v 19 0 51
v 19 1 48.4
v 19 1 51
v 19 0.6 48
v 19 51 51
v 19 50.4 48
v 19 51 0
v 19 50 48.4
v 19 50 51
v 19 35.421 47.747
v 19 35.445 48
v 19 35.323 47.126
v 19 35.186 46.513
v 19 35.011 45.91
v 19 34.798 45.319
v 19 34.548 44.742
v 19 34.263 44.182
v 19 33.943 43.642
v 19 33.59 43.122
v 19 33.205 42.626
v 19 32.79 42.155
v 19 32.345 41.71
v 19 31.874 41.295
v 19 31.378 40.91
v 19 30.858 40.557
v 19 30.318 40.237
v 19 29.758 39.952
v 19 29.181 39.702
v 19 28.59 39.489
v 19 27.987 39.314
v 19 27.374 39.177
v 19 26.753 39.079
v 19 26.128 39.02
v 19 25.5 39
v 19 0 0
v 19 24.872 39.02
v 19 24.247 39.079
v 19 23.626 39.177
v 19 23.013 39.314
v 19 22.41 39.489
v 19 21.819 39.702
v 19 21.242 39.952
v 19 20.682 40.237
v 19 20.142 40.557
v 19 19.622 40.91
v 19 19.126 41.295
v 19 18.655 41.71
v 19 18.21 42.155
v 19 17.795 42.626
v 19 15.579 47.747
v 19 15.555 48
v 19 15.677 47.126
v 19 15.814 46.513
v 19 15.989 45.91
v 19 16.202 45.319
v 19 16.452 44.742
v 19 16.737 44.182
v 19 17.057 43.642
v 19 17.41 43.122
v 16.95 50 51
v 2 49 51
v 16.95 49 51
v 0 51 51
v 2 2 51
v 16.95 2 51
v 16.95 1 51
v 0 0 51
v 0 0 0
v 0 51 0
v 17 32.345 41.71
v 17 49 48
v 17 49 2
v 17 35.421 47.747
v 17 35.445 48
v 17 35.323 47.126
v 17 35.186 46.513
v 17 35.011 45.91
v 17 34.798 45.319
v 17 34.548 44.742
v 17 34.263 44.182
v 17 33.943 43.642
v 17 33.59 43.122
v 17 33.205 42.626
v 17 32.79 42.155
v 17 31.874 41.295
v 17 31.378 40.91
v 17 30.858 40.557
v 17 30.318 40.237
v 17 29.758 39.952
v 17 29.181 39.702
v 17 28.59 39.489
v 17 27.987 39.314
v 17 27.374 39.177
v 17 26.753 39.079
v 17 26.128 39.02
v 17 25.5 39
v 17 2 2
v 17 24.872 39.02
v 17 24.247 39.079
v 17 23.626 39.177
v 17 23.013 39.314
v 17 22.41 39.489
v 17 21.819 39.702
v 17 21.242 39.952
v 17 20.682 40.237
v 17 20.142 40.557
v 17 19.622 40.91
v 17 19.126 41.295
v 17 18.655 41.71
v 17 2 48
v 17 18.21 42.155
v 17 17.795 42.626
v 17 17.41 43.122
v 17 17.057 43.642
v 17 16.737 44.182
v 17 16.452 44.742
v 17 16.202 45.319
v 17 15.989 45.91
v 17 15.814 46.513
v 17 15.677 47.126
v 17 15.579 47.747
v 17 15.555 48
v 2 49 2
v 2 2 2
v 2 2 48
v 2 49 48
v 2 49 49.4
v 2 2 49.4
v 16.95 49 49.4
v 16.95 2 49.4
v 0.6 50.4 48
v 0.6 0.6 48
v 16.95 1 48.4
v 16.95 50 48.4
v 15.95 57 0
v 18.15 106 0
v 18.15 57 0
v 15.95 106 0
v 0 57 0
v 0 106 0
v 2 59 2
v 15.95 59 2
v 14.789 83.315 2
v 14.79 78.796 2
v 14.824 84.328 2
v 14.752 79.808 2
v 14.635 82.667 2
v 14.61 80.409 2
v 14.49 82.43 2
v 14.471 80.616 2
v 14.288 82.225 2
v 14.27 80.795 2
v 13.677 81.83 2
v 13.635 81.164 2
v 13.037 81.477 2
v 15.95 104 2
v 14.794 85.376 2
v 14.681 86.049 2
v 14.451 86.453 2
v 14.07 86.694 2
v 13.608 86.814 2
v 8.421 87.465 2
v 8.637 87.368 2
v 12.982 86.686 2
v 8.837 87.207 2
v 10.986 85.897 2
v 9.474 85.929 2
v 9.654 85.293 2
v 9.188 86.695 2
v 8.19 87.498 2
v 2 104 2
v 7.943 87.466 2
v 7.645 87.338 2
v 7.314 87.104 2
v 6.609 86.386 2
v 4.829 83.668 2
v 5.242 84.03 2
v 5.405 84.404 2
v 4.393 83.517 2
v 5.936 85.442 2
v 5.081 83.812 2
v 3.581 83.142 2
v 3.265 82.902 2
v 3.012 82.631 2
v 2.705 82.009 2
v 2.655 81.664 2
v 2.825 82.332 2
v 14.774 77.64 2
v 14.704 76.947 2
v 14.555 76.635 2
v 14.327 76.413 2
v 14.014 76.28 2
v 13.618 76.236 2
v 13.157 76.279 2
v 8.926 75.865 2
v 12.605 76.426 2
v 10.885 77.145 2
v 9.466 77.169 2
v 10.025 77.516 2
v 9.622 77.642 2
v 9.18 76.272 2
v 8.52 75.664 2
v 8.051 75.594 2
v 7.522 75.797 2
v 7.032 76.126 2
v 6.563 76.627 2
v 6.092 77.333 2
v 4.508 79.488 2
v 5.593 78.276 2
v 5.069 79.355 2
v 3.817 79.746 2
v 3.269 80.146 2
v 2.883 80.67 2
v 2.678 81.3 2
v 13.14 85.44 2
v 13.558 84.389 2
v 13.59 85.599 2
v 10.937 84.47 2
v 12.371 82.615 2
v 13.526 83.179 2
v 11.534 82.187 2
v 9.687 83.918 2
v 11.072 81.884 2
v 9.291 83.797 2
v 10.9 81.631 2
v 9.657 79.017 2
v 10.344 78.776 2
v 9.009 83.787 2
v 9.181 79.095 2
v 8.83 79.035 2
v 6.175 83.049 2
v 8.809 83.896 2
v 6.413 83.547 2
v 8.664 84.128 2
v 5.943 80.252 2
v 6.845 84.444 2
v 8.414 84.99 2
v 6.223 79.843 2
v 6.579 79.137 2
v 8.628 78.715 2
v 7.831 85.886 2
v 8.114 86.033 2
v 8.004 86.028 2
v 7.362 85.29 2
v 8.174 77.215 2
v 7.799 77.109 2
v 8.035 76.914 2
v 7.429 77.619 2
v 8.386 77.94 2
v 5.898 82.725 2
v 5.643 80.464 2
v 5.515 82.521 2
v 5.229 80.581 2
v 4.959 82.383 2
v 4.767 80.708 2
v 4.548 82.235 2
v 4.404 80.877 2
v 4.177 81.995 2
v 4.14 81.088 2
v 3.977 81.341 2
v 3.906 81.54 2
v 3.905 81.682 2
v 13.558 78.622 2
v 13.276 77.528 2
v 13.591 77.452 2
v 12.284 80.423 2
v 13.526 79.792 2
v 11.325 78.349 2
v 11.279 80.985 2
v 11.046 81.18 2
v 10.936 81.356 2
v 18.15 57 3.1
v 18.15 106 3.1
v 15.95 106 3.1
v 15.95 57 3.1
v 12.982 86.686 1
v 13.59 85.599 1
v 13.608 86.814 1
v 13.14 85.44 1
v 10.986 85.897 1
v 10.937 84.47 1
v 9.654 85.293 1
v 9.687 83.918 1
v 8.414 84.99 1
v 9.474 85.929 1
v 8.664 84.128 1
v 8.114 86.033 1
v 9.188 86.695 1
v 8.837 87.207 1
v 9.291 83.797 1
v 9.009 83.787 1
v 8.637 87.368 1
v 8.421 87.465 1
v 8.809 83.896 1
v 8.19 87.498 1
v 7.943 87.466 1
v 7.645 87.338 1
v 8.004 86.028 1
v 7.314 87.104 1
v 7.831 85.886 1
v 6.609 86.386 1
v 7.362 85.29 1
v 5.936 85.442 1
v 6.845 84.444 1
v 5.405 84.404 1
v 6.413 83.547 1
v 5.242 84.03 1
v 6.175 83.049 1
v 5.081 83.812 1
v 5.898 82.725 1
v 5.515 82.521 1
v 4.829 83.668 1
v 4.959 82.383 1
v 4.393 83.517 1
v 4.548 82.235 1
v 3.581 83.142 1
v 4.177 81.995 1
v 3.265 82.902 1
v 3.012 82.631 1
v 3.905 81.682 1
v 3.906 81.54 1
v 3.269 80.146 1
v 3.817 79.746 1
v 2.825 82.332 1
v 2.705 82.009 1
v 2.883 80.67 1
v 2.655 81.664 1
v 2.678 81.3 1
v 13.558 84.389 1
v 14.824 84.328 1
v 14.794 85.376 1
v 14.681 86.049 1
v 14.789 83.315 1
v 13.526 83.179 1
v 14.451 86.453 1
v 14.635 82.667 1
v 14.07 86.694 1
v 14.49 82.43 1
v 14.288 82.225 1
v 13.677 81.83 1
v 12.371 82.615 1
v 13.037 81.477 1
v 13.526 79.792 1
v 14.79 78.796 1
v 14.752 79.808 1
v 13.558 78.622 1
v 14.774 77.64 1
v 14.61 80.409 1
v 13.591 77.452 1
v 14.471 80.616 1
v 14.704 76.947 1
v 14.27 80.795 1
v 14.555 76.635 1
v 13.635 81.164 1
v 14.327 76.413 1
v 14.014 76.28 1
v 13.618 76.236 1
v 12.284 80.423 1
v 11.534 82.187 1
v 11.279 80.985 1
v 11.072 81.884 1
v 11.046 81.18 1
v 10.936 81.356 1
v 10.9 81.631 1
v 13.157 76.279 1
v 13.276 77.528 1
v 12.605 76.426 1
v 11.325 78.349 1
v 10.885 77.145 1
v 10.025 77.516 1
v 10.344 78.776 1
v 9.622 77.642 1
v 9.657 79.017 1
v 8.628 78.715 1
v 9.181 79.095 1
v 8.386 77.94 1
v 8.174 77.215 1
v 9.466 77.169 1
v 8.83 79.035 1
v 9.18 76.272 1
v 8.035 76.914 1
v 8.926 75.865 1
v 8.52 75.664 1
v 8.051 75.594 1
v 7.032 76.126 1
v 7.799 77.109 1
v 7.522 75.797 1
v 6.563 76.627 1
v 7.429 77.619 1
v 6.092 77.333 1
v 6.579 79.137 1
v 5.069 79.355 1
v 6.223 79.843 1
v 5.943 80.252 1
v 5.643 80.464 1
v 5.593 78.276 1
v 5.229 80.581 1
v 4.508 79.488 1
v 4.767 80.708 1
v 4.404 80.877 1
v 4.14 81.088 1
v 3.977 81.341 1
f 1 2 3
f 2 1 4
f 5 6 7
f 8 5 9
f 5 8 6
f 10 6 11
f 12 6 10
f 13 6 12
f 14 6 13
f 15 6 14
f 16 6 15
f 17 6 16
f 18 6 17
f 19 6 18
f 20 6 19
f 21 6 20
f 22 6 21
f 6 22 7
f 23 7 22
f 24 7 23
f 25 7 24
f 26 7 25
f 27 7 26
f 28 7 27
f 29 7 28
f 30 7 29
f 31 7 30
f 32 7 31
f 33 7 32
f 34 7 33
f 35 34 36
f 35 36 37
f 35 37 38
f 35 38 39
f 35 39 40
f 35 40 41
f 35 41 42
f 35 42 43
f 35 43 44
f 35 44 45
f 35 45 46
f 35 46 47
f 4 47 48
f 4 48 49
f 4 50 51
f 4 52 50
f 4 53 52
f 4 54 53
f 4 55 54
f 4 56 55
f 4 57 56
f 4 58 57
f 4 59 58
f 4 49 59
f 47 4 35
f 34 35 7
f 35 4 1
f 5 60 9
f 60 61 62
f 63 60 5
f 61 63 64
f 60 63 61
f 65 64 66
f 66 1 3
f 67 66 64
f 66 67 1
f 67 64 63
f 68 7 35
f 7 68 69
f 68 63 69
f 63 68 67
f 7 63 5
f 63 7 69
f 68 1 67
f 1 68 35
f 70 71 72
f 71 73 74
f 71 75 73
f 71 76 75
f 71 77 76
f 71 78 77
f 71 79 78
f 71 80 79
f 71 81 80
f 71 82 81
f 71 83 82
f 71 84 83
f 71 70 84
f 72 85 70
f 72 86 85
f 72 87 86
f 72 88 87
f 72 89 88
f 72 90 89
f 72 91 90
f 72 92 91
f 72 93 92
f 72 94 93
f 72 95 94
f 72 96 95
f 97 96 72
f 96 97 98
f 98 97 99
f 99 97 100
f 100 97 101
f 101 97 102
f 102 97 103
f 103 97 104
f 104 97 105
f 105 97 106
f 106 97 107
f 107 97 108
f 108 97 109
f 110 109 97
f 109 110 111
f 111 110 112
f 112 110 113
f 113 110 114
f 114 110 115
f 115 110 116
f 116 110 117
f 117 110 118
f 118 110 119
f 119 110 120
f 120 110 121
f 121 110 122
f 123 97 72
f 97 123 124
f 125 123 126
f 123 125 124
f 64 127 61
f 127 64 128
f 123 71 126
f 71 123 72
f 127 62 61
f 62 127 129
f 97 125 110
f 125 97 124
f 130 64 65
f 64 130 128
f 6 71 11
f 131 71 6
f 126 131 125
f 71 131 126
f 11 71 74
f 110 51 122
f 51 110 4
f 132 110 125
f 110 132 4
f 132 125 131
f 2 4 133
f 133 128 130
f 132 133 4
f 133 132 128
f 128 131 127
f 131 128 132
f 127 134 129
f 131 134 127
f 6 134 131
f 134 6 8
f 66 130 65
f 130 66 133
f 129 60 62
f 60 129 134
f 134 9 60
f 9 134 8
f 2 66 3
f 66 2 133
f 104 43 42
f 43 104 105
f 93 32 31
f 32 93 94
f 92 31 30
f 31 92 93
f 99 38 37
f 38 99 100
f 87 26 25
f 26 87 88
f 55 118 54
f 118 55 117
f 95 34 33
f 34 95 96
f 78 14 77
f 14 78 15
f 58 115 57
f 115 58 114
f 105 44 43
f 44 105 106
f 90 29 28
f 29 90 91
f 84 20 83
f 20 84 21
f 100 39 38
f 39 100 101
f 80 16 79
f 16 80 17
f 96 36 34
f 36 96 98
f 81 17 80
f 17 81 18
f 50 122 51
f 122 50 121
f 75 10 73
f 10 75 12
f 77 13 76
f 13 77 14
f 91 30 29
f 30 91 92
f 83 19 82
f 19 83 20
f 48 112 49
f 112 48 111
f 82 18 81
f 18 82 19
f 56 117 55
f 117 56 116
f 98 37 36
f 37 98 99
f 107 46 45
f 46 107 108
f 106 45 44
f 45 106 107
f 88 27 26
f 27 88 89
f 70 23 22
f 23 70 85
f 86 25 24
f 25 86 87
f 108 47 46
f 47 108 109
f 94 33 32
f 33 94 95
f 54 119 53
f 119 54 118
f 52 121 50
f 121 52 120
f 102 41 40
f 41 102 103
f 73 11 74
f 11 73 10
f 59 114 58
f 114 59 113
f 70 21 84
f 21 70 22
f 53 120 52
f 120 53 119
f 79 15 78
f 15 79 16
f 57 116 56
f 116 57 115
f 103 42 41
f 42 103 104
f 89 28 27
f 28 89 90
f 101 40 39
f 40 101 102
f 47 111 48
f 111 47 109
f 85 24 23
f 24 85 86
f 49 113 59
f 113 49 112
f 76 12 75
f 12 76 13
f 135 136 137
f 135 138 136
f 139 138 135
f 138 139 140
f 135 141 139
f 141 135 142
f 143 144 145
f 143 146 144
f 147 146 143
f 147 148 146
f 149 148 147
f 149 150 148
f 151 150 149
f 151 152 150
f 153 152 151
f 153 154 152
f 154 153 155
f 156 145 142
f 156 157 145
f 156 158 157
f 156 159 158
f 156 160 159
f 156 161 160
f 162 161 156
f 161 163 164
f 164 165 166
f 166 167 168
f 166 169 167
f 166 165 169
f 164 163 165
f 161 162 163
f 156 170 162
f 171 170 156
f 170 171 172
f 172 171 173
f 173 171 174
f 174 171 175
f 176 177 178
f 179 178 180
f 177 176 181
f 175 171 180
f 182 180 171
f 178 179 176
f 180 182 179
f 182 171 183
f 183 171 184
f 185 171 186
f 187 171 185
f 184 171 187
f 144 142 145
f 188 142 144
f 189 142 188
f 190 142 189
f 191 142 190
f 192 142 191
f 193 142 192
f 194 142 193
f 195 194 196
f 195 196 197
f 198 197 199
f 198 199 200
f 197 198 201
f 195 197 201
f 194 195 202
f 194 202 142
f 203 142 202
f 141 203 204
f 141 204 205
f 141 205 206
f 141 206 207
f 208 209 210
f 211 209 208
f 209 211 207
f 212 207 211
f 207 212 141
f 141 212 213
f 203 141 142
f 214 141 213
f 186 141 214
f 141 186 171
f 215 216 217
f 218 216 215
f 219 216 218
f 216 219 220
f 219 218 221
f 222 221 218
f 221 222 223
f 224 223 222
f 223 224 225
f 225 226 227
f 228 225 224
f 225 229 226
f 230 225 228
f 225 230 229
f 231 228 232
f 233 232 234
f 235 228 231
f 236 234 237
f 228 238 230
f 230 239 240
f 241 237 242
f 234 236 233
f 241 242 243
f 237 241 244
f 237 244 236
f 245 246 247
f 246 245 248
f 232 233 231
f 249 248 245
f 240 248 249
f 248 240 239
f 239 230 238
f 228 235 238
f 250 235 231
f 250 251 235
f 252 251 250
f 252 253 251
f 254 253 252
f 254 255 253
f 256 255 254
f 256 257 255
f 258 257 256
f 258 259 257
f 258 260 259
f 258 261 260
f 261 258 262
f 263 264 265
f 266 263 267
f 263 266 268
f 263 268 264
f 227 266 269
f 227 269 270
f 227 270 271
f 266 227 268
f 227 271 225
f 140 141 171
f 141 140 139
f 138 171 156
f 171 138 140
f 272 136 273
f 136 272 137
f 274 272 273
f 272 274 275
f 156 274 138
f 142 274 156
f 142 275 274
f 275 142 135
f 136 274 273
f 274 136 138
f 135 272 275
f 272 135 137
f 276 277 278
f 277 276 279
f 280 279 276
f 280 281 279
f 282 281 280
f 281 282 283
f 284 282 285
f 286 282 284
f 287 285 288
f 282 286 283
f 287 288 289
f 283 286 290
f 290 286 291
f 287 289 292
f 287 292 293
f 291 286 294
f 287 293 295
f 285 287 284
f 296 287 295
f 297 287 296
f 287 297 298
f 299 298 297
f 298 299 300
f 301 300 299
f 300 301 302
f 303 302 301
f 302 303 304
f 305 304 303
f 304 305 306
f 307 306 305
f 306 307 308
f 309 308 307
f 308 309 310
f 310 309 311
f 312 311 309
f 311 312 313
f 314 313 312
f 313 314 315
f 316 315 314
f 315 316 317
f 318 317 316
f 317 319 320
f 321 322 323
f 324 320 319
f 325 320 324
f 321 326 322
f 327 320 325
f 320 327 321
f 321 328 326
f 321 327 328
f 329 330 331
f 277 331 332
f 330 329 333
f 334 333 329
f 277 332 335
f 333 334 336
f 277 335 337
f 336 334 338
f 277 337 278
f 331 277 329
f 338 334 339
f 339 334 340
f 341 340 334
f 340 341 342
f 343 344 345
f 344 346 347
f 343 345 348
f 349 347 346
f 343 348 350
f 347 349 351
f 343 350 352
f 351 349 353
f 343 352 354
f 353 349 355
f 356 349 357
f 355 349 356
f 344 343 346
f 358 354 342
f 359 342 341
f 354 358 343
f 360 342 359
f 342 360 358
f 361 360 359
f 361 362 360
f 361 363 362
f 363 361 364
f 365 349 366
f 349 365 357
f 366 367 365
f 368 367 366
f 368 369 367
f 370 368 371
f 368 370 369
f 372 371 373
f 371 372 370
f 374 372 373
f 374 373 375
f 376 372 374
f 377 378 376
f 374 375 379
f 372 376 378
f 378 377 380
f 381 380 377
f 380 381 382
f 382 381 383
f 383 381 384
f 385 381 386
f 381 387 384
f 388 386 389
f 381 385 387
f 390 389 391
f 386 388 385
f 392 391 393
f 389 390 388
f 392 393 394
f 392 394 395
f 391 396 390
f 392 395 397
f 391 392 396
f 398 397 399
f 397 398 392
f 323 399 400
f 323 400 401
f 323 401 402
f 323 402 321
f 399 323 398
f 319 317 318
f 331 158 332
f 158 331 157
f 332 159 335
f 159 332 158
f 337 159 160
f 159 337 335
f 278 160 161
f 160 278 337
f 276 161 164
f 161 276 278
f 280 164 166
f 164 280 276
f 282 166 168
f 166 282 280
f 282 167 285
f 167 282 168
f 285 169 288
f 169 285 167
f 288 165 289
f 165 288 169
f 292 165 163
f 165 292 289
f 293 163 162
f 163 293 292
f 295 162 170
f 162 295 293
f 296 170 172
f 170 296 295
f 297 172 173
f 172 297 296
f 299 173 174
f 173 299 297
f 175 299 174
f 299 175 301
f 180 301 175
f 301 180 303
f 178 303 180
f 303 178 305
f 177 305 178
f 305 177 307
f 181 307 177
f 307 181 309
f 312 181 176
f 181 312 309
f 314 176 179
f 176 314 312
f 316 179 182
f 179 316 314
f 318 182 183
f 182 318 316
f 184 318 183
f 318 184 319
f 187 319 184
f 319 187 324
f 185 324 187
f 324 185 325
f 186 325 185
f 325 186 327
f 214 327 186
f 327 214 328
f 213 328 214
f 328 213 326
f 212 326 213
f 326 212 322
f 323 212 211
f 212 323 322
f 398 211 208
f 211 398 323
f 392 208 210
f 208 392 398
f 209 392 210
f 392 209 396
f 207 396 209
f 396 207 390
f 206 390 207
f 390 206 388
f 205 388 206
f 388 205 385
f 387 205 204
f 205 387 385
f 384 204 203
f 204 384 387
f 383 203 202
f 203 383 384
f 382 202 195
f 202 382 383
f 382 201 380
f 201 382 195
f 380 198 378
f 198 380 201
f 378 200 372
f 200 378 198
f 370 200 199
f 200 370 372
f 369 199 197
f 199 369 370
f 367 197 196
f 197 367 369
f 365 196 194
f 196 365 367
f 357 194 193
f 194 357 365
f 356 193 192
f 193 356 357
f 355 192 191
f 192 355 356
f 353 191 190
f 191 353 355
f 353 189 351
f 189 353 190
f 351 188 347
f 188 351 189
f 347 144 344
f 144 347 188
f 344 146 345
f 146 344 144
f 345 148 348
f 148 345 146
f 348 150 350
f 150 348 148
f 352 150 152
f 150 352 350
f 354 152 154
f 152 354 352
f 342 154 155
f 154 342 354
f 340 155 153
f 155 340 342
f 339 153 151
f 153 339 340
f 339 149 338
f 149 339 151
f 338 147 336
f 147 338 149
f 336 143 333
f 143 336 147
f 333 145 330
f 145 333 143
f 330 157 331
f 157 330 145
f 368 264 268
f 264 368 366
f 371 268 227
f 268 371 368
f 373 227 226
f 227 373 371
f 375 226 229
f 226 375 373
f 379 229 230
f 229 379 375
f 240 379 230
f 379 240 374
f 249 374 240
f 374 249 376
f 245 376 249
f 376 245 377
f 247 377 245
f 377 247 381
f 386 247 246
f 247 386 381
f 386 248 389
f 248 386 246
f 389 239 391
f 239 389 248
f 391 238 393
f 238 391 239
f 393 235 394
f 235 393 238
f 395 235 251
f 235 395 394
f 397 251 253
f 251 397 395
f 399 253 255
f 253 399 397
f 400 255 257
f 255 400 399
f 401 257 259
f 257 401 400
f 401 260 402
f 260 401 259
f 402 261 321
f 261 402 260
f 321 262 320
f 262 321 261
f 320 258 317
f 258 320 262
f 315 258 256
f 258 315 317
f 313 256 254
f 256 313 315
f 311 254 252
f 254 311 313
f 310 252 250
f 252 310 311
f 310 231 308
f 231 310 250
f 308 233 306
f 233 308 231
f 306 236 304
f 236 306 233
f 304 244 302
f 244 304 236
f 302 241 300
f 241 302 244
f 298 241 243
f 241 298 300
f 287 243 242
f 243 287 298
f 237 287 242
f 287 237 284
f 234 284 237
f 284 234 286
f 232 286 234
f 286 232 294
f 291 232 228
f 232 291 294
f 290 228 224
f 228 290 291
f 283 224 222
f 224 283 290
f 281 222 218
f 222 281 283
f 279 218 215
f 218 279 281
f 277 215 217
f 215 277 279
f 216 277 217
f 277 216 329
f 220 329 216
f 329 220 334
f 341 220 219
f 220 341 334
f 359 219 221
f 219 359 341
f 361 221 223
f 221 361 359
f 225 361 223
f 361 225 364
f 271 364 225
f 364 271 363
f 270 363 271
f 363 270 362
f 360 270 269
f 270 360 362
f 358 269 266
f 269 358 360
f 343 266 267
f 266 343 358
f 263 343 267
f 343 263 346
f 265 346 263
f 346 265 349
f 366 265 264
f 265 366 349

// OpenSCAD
// file: carcassonne_box.scad
/**
 * @file carcassonne_box.scad
 * @author Conlan Wesson (modified by [Your Name])
 * Template for Carcassonne boxes.
 * @copyright Creative Commons Attribution-NonCommercial-ShareAlike 4.0
 */

mm = 1;
cm = 10*mm;

tiles = 2*mm;
clearance = 3*mm;

width = 47*mm;
thick = 2.5*mm;
wall = 2*mm;

/**
 * Lid for box.
 * @param sections Array of section lengths.
 * @param columns Number of columns.
 * @param icon Path to icon DXF file.
 * @param rot Icon rotation in degrees.
 * @param mult Icon scale.
 * @param xoff X-offset of icon from center.
 * @param yoff Y-offset of icon from center.
 */
module carcassonne_lid(sections, columns=1, icon=false, icon2=false, icon3=false, rot=0, mult=1, xoff=0, yoff=0, mult2=1, xoff2=0, yoff2=0, mult3=1, xoff3=0, yoff3=0, g=0){
    divider_thickness = wall/2;
    length = sum(sections) + (divider_thickness * (len(sections) - 1));
    w = length+(1.5*wall)+.1;
    l = (width*columns)+wall;
    h = wall;
    d = 2;

    CubePoints = [
        [ 0-g, 0-g,   0 ],  //0
        [ w+g, 0-g,   0 ],  //1
        [ w+g, l+g,   0 ],  //2
        [ 0-g, l+g,   0 ],  //3
        [   d,   d, h+g ],  //4
        [   w,   d, h+g ],  //5
        [   w, l-d, h+g ],  //6
        [   d, l-d, h+g ]   //7
    ];

    CubeFaces = [
        [0,1,2,3],  // bottom
        [4,5,1,0],  // front
        [7,6,5,4],  // top
        [5,6,2,1],  // right
        [6,7,3,2],  // back
        [7,4,0,3]   // left
    ];

    difference(){
        union(){
            polyhedron( CubePoints, CubeFaces );
            translate([w-wall-.15,0,0]) cube([wall+.2,l, (1.5*wall)+.1]);
        }
        if(icon){
            translate([w/2+xoff,l/3+yoff,h-(wall/2)]){
                linear_extrude(height=(wall)+.1){
                    rotate(rot) scale(mult) import(icon);
                }
            }
        }
        if(icon2){
            translate([w/2+xoff2,l/3+yoff2,h-(wall/2)]){
                linear_extrude(height=(wall)+.1){
                    rotate(rot) scale(mult2) import(icon2);
                }
            }
        }
        if(icon3){
            translate([w/2+xoff3,l/3+yoff3,h-(wall/2)]){
                linear_extrude(height=(wall)+.1){
                    rotate(rot) scale(mult3) import(icon3);
                }
            }
        }
    }
}

/**
 * Carcassonne card box.
 * @param sections Array of section lengths.
 * @param columns Number of columns.
 */
module carcassonne_box(sections, columns=1){
    divider_thickness = wall/2;
    raw_length = sum(sections) + (divider_thickness * (len(sections) - 1));
    length = raw_length;

    section_count = len(sections);

    difference(){
        union(){
            difference(){
                // Outer walls
                cube([length+(2*wall), (width*columns)+(2*wall), width+(2*wall)]);
                // Cavity
                translate([wall, wall, wall]){
                    cube([length, width*columns, (width+wall)+.1]);
                }
            }
            // Dividers
            for(col = [0:columns-1]){
                divider_positions = [for(i=0; i<len(sections)-1; i=i+1) 
                    sum([for(j=[0:i]) sections[j]]) + (i * divider_thickness)];
                for(pos = divider_positions){
                    translate([pos+wall, width*col+wall, 0]) 
                        cube([divider_thickness, width, width-(2*wall)]);
                }
                if(col > 0){
                    translate([0, width*col+(wall/2), 0]) 
                        cube([length+(2*wall)-18.0, wall/2, width-(2*wall)]);
                }
            }
        }
        union(){
            // Notch
            for(col = [0:columns-1]){
                translate([wall, wall+(width*col), wall]){
                    translate([0, width/2, width])
                    rotate([0, 90, 0]){
                        cylinder(r=10, h=length+(2*wall), $fn=100);
                    }
                }
            }
            // Track
            translate([wall/2, wall/2, width+wall-1])
                carcassonne_lid(sections, columns, g=0.4);
        }
    }
}


// Helper function to sum an array
function sum(v, i = 0, r = 0) = i < len(v) ? sum(v, i + 1, r + v[i]) : r;
// main file
/**
 * @file bets.scad
 * @author Andrew Hargrave
 * The Bets Carcossonne box.
 * @copyright Creative Commons Attribution-NonCommercial-ShareAlike 4.0
 */

include <carcassonne_box.scad>

sections = [15 * mm];
columns = 1;
icon="0-phantom.dxf";

carcassonne_box(sections, columns);
translate([0,width*columns+10,0]) carcassonne_lid(sections, columns, icon, rot=90, mult=.4, xoff=6, yoff=2);
